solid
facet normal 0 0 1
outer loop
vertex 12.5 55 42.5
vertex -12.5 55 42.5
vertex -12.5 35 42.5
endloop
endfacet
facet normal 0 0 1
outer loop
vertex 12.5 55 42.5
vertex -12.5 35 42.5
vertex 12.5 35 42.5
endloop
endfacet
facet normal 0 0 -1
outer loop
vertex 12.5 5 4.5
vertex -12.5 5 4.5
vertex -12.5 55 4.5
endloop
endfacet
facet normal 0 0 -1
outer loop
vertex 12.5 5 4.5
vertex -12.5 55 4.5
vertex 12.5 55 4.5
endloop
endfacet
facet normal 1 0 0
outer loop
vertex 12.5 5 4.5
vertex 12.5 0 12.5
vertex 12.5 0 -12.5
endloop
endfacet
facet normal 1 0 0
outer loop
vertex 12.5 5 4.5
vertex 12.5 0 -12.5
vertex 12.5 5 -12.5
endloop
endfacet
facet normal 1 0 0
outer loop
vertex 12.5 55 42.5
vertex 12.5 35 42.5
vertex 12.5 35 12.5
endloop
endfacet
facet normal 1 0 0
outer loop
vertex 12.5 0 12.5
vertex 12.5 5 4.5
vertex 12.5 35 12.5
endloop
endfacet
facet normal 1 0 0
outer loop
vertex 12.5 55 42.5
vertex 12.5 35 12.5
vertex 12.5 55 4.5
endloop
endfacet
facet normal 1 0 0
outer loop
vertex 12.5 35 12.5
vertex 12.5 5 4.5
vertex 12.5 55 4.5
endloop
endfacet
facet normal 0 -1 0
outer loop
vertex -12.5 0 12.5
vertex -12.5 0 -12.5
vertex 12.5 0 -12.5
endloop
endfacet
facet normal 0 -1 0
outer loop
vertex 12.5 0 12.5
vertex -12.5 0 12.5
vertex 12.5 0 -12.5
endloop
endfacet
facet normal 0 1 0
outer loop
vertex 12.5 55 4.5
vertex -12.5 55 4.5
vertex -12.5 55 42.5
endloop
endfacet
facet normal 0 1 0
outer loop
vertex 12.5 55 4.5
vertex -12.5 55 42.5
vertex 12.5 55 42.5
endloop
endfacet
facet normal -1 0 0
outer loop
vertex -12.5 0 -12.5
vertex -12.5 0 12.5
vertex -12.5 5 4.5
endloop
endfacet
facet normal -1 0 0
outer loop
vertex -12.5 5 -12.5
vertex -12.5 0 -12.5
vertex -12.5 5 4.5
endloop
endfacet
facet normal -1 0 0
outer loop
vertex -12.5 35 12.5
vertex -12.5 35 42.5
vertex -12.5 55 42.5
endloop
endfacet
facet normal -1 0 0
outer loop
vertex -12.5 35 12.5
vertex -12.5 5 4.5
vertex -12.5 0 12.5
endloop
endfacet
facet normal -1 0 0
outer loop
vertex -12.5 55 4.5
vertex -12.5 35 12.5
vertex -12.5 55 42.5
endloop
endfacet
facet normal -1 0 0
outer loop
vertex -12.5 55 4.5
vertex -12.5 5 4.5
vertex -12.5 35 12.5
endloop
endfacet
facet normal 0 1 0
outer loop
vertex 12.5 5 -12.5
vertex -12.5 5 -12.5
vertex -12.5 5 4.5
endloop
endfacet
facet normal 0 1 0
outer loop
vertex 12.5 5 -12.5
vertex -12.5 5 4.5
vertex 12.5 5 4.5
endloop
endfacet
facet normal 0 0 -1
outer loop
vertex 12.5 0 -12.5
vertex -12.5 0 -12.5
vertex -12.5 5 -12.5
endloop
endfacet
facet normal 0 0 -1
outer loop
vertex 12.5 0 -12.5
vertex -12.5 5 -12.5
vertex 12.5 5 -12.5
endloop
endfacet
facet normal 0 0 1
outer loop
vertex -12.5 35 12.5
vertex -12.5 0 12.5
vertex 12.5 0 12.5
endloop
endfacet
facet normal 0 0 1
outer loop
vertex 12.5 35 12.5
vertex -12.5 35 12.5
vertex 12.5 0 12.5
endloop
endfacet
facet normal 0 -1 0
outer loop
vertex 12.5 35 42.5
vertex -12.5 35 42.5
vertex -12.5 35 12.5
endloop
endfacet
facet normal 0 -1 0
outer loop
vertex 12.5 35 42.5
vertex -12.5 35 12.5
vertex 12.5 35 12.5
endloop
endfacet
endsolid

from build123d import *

# Parameters (mm, degrees)
SKETCH1_W           = 25
SKETCH1_H           = 25
BOSS_EXTRUDE1_DEPTH = 5
SKETCH2_W           = 25
SKETCH2_H           = 8
BOSS_EXTRUDE2_DEPTH = 50
SKETCH3_W           = 25
SKETCH3_H           = 20
BOSS_EXTRUDE3_DEPTH = 30


with BuildPart() as part:
    # Sketch1 → Boss-Extrude1 (new body)
    with BuildSketch(Plane(origin=(0, 0, 0), x_dir=(1, 0, 0), z_dir=(0, 1, 0))):
        Rectangle(SKETCH1_W, SKETCH1_H)
    extrude(amount=BOSS_EXTRUDE1_DEPTH)

    # Sketch2 → Boss-Extrude2 (add)
    with BuildSketch(Plane(origin=(0, 5, 0), x_dir=(1, 0, 0), z_dir=(0, 1, 0))):
        with Locations((0, -8.5)):
            Rectangle(SKETCH2_W, SKETCH2_H)
    extrude(amount=BOSS_EXTRUDE2_DEPTH)

    # Sketch3 → Boss-Extrude3 (add)
    with BuildSketch(Plane.XY.offset(12.5)):
        with Locations((0, 45)):
            Rectangle(SKETCH3_W, SKETCH3_H)
    extrude(amount=BOSS_EXTRUDE3_DEPTH)


solid = part.part
